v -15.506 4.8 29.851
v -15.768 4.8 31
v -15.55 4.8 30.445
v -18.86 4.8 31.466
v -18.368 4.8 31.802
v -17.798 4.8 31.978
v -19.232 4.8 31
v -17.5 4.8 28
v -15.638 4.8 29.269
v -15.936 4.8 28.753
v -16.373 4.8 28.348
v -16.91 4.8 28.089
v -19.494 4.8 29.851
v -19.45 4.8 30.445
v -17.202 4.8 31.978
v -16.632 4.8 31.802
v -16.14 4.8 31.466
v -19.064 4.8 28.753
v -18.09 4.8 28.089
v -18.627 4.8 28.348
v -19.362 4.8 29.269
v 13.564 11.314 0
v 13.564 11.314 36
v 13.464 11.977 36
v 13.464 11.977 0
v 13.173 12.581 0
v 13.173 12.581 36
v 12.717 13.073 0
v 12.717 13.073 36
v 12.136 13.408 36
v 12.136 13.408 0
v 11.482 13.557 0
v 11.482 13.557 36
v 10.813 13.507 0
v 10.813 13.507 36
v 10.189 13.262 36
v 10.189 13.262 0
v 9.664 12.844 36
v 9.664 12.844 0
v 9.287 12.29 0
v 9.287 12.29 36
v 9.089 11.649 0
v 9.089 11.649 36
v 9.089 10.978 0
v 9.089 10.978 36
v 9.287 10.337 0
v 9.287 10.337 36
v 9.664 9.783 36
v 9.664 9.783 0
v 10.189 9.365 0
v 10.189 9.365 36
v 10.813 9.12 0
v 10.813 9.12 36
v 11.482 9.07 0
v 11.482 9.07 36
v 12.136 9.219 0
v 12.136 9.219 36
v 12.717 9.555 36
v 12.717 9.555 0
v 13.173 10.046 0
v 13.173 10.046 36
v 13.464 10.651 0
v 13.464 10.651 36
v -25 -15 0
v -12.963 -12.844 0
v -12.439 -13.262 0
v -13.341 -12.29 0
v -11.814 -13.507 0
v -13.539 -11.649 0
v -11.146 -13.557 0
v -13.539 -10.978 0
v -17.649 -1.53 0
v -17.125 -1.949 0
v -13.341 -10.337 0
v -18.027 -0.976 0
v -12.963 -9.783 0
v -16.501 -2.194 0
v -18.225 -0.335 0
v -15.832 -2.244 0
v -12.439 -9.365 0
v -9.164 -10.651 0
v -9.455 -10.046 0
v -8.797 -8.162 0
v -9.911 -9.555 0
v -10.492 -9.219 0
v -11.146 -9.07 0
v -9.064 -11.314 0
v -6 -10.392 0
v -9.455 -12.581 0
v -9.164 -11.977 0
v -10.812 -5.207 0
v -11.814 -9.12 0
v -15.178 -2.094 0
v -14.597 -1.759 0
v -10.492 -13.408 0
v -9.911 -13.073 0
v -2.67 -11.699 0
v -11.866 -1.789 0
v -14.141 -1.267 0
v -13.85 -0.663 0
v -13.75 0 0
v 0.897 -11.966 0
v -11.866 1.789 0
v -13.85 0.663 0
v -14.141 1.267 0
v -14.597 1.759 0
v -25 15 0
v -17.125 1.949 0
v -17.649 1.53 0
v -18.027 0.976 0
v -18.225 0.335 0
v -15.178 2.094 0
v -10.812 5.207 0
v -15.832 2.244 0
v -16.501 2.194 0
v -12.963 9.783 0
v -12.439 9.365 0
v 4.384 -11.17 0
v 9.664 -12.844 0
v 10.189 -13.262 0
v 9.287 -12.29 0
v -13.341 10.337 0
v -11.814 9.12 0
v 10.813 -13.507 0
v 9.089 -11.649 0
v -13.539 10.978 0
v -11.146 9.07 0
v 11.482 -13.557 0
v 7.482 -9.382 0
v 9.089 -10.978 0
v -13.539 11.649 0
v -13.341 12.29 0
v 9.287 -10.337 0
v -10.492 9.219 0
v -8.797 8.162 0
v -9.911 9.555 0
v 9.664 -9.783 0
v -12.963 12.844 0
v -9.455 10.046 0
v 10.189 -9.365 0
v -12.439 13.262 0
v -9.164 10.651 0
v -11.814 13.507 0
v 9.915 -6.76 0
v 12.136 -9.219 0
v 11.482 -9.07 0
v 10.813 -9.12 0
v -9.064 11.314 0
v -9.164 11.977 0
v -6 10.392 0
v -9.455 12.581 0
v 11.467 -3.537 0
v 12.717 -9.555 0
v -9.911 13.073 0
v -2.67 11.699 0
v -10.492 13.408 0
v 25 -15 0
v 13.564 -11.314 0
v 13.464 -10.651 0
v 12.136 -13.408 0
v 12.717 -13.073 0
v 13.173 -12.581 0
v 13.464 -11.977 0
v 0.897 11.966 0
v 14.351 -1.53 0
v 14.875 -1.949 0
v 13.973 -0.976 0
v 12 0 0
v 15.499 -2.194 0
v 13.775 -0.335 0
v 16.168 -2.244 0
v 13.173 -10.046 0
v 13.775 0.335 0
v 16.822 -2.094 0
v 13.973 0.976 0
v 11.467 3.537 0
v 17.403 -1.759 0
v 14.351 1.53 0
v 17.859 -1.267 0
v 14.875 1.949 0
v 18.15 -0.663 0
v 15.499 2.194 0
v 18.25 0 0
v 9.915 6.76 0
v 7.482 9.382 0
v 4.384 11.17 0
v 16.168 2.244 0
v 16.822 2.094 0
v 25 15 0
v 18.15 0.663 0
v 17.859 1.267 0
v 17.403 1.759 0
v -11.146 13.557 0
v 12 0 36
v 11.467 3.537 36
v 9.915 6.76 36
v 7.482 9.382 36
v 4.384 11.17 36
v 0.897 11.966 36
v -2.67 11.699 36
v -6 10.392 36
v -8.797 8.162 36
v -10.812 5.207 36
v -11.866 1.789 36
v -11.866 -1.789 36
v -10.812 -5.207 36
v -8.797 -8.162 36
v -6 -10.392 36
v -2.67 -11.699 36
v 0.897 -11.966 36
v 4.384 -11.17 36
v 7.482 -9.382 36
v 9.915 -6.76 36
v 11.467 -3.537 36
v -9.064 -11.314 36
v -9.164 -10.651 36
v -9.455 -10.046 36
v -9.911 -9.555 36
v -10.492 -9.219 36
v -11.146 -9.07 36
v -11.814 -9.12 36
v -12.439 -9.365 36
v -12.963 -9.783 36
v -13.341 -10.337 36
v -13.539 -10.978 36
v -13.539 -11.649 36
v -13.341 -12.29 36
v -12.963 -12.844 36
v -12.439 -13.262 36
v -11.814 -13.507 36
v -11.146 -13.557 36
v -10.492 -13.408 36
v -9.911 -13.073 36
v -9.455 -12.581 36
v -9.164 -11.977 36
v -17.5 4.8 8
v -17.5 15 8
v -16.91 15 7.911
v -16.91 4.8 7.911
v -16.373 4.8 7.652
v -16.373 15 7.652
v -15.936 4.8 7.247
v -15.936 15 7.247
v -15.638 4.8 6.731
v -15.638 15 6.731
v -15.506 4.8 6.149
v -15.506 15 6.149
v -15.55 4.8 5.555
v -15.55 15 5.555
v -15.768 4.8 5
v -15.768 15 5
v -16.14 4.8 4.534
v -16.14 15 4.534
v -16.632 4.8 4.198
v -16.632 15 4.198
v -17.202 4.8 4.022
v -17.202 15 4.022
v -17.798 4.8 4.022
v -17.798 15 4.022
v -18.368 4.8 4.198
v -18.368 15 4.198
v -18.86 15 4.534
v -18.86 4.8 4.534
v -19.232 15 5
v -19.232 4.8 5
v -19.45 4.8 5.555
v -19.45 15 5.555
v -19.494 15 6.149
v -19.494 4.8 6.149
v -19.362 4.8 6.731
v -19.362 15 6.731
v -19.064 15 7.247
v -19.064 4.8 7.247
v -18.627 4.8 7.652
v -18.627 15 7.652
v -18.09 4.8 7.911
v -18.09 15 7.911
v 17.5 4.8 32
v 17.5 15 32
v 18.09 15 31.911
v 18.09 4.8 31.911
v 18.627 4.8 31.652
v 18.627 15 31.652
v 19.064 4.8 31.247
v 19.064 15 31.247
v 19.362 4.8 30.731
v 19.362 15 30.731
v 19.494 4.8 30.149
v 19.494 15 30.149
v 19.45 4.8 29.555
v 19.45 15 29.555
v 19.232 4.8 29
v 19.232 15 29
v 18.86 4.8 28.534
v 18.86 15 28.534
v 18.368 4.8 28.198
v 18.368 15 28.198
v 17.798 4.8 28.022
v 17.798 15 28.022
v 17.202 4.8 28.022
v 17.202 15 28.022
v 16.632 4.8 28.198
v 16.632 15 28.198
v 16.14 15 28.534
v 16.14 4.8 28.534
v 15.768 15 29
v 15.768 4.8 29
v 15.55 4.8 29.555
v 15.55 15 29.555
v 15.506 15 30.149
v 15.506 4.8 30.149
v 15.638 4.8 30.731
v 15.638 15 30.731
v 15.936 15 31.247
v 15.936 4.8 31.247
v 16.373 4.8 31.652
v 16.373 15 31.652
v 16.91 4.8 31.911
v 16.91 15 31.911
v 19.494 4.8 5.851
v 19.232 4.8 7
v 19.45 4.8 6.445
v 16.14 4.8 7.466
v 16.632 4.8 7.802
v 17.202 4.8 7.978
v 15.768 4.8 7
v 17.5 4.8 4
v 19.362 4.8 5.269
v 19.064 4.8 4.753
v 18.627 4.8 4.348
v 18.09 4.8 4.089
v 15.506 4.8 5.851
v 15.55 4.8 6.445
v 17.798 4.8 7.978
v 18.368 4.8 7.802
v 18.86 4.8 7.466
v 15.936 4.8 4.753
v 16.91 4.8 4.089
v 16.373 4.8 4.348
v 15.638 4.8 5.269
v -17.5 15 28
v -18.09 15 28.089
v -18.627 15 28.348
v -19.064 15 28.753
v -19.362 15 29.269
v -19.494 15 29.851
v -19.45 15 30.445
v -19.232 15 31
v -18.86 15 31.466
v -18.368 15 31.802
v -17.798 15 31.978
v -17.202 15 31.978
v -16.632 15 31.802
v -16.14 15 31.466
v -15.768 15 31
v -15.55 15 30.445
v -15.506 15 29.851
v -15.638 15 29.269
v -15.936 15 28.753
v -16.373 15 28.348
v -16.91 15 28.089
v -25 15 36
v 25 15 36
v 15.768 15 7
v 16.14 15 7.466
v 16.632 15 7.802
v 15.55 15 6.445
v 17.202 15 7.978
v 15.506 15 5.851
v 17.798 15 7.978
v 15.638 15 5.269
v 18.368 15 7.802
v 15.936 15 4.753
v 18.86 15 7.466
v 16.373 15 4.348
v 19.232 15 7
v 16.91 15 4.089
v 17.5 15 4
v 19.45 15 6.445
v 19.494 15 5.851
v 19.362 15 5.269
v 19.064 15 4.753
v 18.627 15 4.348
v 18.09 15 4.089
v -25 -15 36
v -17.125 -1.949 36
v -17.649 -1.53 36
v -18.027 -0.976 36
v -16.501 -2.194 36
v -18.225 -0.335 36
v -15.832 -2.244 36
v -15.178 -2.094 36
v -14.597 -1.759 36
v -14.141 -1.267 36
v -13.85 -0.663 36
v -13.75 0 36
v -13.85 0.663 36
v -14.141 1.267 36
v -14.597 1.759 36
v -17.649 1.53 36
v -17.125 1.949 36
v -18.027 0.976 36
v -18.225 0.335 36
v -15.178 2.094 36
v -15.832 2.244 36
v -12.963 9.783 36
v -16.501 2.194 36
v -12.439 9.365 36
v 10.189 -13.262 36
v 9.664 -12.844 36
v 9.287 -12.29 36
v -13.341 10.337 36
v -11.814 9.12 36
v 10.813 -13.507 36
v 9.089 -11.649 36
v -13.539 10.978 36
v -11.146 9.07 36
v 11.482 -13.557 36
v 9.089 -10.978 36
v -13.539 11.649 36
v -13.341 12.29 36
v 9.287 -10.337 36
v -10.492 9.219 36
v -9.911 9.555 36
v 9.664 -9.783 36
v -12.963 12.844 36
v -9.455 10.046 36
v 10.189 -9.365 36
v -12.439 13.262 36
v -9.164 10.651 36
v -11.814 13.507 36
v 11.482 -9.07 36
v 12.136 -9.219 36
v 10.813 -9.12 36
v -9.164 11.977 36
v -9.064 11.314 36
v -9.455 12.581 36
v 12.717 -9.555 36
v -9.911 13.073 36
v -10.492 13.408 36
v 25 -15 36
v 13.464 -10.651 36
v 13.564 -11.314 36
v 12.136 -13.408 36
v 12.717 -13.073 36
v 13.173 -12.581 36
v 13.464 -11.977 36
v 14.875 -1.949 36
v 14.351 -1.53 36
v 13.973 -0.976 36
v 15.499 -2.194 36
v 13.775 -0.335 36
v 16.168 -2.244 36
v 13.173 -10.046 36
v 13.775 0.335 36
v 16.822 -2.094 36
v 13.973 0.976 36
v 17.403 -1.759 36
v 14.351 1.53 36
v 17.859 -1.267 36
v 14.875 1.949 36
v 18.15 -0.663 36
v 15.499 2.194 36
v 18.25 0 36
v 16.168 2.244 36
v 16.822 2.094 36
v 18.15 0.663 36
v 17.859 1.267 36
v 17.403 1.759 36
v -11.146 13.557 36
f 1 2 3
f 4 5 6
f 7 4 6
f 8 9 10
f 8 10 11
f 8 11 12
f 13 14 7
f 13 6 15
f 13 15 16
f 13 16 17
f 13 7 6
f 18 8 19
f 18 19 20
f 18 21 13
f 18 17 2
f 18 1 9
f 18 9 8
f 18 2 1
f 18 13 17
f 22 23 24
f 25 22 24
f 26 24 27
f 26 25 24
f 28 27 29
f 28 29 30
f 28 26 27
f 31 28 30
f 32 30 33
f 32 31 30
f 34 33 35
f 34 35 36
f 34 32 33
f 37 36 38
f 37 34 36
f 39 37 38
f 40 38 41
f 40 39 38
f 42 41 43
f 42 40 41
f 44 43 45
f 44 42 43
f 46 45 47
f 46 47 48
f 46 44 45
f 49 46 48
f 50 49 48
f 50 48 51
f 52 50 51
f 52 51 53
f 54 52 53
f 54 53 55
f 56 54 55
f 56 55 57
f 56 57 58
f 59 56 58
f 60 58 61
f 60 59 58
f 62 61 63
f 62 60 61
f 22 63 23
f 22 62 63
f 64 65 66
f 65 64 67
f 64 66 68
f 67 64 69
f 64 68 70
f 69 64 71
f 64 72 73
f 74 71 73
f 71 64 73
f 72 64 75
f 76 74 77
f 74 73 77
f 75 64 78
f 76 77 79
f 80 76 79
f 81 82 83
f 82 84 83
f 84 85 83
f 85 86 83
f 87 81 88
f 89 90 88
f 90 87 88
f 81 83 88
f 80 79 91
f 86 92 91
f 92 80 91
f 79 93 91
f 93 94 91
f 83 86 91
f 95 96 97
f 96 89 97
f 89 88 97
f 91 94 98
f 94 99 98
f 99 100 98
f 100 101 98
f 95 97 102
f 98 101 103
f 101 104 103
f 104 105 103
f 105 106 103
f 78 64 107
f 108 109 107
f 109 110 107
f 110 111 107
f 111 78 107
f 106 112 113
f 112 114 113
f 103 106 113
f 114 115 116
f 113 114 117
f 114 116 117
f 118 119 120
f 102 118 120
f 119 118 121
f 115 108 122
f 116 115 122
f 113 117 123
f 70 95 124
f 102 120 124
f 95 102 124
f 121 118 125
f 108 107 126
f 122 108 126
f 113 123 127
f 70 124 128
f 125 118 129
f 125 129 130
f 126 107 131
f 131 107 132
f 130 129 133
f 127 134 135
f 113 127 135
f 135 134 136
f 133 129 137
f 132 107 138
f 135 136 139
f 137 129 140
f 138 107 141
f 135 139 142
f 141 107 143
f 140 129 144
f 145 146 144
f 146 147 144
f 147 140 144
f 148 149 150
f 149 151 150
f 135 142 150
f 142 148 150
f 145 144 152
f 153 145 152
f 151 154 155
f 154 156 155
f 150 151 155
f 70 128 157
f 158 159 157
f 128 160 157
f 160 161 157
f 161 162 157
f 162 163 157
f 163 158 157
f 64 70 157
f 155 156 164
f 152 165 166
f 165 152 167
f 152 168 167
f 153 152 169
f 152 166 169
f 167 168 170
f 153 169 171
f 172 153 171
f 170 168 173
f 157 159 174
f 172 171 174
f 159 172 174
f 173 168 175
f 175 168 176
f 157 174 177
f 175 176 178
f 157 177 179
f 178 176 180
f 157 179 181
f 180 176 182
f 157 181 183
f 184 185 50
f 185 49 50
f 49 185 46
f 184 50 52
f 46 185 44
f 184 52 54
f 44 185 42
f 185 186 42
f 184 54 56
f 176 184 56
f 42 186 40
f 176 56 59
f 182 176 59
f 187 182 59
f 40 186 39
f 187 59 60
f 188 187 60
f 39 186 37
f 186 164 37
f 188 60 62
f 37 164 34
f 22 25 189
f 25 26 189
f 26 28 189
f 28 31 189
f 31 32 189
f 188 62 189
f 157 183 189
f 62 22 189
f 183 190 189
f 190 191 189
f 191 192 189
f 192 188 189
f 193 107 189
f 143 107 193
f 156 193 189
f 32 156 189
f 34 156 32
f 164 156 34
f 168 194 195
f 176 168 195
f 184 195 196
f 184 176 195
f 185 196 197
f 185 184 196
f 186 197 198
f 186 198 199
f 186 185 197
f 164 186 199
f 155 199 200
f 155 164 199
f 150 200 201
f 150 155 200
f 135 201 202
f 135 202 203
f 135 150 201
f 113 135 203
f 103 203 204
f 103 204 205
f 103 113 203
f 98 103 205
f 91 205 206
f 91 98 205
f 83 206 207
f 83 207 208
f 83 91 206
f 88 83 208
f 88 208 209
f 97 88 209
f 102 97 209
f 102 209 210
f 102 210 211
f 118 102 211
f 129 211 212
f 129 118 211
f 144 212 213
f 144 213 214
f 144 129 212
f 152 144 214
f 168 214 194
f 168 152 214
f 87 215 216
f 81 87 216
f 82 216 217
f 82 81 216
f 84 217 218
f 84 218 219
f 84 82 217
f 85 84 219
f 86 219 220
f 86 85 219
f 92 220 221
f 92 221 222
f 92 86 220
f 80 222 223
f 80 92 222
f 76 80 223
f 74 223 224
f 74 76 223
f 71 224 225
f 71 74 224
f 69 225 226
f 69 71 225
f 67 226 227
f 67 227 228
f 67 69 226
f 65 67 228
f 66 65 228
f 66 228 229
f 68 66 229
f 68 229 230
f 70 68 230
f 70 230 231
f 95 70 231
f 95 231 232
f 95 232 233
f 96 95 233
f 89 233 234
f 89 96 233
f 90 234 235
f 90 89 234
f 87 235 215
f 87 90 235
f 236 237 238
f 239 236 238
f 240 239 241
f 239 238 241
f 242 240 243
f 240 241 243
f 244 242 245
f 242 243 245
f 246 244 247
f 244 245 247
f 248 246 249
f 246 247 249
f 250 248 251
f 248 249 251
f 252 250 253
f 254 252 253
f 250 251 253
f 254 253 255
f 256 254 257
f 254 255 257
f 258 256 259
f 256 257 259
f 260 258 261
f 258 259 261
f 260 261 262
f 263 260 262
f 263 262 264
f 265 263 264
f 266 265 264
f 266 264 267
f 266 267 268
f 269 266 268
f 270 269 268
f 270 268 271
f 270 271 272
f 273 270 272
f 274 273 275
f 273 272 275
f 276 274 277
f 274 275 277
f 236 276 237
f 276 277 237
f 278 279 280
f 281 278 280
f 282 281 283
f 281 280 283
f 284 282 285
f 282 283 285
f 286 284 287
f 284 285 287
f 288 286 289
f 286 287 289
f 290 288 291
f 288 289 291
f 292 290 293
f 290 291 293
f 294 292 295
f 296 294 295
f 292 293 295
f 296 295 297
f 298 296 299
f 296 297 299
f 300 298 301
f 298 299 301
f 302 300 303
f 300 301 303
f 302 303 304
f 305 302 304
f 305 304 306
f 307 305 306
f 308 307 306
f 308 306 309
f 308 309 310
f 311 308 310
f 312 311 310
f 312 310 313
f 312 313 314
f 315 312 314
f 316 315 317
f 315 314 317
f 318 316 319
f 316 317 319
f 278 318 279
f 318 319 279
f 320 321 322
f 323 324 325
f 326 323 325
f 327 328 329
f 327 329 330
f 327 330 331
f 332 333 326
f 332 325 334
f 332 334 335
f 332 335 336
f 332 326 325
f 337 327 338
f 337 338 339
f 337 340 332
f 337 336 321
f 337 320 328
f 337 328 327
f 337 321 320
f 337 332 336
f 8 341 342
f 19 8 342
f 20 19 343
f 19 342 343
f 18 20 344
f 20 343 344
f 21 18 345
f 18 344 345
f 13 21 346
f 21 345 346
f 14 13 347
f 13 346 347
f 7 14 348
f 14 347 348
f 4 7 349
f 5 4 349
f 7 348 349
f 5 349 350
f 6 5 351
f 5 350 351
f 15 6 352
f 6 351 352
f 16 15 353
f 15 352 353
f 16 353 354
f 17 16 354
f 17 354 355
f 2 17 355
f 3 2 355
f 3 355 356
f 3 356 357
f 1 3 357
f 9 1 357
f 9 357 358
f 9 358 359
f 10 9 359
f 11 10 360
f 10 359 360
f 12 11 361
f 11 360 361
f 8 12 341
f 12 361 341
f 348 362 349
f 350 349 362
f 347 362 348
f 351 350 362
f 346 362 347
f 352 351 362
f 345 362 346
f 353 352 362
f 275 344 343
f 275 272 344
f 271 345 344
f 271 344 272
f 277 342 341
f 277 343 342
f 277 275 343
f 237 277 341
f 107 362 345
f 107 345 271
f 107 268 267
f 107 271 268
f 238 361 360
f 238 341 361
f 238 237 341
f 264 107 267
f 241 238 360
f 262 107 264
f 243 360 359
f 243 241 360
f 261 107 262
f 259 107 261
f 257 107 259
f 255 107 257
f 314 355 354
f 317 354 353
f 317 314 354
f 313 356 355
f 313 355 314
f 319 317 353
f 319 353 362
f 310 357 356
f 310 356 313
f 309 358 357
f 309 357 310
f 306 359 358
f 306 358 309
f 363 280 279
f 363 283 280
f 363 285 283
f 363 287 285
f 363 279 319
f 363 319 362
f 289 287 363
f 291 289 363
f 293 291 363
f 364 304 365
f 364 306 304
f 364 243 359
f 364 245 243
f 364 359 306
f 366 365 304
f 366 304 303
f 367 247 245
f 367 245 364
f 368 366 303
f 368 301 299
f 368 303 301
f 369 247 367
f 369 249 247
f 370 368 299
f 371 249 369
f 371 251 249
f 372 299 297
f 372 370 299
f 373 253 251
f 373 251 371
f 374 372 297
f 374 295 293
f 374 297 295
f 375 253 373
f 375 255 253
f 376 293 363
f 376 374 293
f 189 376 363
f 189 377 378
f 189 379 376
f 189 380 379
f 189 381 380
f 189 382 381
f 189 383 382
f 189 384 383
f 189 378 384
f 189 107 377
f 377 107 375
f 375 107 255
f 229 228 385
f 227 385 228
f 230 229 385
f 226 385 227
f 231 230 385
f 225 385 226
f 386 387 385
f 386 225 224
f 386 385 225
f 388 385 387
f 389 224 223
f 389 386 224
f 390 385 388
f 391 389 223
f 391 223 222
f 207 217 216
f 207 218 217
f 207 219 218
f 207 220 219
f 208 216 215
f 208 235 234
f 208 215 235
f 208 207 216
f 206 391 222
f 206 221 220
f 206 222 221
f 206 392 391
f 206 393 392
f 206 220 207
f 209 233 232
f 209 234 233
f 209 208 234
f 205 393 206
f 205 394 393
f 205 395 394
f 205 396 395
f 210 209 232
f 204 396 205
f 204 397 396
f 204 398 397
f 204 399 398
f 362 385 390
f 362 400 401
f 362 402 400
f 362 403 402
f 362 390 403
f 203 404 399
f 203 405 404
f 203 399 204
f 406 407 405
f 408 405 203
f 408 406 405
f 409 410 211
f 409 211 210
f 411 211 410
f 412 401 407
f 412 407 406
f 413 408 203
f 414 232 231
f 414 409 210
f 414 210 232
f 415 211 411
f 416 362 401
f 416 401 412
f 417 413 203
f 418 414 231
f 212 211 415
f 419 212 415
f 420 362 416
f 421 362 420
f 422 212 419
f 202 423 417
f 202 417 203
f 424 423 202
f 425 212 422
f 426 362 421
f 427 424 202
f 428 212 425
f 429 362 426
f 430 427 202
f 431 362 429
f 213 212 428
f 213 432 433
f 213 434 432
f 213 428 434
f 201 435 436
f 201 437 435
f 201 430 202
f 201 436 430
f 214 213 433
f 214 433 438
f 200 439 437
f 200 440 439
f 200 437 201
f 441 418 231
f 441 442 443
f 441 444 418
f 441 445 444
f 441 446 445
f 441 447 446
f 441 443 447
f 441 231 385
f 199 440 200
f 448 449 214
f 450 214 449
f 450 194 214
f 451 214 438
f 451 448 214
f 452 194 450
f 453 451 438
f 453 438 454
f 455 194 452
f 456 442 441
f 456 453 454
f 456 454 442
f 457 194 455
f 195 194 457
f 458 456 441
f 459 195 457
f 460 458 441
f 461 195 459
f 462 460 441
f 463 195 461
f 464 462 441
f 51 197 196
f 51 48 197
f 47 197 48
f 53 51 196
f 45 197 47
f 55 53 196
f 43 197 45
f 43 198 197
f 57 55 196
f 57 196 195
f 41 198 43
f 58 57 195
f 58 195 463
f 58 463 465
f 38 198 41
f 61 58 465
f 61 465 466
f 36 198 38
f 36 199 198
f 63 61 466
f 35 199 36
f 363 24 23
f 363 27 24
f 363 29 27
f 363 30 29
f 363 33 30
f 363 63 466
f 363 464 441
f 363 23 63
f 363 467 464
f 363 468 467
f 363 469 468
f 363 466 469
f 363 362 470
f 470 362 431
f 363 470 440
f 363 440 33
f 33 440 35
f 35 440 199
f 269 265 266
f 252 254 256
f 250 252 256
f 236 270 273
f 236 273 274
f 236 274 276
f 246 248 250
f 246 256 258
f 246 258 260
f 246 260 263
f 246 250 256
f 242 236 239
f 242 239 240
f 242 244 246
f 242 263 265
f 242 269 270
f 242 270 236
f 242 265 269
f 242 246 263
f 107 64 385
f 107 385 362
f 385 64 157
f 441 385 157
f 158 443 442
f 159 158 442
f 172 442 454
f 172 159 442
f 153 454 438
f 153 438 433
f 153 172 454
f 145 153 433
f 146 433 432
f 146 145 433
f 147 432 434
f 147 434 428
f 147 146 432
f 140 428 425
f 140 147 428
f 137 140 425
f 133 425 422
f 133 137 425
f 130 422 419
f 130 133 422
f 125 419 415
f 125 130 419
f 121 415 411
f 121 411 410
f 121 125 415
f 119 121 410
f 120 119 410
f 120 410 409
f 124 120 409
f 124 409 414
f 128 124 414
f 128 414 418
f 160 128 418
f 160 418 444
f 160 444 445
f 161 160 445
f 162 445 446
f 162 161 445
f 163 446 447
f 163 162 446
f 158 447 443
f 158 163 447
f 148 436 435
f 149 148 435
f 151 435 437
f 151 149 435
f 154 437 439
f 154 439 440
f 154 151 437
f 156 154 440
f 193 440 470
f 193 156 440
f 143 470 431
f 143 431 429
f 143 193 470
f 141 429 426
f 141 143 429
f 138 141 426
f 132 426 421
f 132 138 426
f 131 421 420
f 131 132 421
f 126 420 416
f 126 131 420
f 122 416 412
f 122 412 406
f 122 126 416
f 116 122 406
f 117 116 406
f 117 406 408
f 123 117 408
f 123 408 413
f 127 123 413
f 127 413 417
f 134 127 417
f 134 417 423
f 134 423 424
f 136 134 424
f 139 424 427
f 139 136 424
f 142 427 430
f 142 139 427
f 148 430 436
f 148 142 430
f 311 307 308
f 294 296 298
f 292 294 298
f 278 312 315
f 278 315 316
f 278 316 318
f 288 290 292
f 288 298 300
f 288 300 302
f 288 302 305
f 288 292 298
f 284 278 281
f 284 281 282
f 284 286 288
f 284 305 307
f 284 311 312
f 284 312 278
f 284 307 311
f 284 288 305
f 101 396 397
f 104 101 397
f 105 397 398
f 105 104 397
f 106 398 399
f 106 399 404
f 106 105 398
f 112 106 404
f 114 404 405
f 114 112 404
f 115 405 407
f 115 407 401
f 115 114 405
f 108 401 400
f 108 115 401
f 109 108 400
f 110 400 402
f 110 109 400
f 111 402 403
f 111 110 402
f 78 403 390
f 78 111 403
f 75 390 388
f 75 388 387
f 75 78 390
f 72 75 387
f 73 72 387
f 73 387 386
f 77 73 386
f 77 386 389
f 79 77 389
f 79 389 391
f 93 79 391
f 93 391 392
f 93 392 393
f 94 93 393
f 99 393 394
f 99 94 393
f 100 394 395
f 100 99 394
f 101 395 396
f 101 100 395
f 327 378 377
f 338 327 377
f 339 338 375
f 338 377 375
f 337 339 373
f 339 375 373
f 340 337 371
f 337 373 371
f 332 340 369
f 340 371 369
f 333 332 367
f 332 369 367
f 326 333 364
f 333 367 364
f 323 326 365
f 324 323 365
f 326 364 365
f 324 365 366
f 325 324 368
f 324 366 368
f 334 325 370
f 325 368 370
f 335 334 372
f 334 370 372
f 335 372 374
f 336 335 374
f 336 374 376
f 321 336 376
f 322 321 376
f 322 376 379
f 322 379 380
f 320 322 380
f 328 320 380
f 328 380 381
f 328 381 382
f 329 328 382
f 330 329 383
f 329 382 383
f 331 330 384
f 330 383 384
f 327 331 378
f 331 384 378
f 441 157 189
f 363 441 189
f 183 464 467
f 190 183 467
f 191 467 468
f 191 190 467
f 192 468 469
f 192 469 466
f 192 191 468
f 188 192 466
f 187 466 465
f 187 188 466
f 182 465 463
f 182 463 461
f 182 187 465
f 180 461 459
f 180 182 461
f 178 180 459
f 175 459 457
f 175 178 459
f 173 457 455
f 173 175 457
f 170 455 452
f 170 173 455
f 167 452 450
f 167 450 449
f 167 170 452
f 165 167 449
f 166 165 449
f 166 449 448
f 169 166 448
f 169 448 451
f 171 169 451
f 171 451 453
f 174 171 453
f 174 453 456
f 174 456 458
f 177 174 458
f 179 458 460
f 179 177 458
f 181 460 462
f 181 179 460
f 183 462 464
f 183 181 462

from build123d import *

# Parameters (mm, degrees)
SKETCH_1_W          = 50
SKETCH_1_H          = 30
SKETCH_1_R          = 2.25
SKETCH_1_R_2        = 12
EXTRUDE_1_DEPTH     = 36
SKETCH_2_R          = 2
CUT_EXTRUDE_1_DEPTH = 10.2


with BuildPart() as part:
    # 草图1 → 凸台-拉伸1 (new body)
    with BuildSketch(Plane.XY):
        Rectangle(SKETCH_1_W, SKETCH_1_H)
        with Locations((-11.313708499, 11.313708499)):
            Circle(SKETCH_1_R, mode=Mode.SUBTRACT)
        with Locations((-16, 0)):
            Circle(SKETCH_1_R, mode=Mode.SUBTRACT)
        with Locations((-11.313708499, -11.313708499)):
            Circle(SKETCH_1_R, mode=Mode.SUBTRACT)
        with Locations((11.313708499, -11.313708499)):
            Circle(SKETCH_1_R, mode=Mode.SUBTRACT)
        with Locations((16, 0)):
            Circle(SKETCH_1_R, mode=Mode.SUBTRACT)
        with Locations((11.313708499, 11.313708499)):
            Circle(SKETCH_1_R, mode=Mode.SUBTRACT)
        Circle(SKETCH_1_R_2, mode=Mode.SUBTRACT)
    extrude(amount=EXTRUDE_1_DEPTH)

    # 草图2 → 切除-拉伸1 (cut)
    with BuildSketch(Plane(origin=(0, 15, 0), x_dir=(1, 0, 0), z_dir=(0, 1, 0))):
        with Locations(Location((17.5, -30, 0), (0, 0, 270))):
            Circle(SKETCH_2_R)
        with Locations(Location((-17.5, -30, 0), (0, 0, 90))):
            Circle(SKETCH_2_R)
        with Locations(Location((-17.5, -6, 0), (0, 0, 270))):
            Circle(SKETCH_2_R)
        with Locations(Location((17.5, -6, 0), (0, 0, 90))):
            Circle(SKETCH_2_R)
    extrude(amount=-CUT_EXTRUDE_1_DEPTH, mode=Mode.SUBTRACT)


solid = part.part
